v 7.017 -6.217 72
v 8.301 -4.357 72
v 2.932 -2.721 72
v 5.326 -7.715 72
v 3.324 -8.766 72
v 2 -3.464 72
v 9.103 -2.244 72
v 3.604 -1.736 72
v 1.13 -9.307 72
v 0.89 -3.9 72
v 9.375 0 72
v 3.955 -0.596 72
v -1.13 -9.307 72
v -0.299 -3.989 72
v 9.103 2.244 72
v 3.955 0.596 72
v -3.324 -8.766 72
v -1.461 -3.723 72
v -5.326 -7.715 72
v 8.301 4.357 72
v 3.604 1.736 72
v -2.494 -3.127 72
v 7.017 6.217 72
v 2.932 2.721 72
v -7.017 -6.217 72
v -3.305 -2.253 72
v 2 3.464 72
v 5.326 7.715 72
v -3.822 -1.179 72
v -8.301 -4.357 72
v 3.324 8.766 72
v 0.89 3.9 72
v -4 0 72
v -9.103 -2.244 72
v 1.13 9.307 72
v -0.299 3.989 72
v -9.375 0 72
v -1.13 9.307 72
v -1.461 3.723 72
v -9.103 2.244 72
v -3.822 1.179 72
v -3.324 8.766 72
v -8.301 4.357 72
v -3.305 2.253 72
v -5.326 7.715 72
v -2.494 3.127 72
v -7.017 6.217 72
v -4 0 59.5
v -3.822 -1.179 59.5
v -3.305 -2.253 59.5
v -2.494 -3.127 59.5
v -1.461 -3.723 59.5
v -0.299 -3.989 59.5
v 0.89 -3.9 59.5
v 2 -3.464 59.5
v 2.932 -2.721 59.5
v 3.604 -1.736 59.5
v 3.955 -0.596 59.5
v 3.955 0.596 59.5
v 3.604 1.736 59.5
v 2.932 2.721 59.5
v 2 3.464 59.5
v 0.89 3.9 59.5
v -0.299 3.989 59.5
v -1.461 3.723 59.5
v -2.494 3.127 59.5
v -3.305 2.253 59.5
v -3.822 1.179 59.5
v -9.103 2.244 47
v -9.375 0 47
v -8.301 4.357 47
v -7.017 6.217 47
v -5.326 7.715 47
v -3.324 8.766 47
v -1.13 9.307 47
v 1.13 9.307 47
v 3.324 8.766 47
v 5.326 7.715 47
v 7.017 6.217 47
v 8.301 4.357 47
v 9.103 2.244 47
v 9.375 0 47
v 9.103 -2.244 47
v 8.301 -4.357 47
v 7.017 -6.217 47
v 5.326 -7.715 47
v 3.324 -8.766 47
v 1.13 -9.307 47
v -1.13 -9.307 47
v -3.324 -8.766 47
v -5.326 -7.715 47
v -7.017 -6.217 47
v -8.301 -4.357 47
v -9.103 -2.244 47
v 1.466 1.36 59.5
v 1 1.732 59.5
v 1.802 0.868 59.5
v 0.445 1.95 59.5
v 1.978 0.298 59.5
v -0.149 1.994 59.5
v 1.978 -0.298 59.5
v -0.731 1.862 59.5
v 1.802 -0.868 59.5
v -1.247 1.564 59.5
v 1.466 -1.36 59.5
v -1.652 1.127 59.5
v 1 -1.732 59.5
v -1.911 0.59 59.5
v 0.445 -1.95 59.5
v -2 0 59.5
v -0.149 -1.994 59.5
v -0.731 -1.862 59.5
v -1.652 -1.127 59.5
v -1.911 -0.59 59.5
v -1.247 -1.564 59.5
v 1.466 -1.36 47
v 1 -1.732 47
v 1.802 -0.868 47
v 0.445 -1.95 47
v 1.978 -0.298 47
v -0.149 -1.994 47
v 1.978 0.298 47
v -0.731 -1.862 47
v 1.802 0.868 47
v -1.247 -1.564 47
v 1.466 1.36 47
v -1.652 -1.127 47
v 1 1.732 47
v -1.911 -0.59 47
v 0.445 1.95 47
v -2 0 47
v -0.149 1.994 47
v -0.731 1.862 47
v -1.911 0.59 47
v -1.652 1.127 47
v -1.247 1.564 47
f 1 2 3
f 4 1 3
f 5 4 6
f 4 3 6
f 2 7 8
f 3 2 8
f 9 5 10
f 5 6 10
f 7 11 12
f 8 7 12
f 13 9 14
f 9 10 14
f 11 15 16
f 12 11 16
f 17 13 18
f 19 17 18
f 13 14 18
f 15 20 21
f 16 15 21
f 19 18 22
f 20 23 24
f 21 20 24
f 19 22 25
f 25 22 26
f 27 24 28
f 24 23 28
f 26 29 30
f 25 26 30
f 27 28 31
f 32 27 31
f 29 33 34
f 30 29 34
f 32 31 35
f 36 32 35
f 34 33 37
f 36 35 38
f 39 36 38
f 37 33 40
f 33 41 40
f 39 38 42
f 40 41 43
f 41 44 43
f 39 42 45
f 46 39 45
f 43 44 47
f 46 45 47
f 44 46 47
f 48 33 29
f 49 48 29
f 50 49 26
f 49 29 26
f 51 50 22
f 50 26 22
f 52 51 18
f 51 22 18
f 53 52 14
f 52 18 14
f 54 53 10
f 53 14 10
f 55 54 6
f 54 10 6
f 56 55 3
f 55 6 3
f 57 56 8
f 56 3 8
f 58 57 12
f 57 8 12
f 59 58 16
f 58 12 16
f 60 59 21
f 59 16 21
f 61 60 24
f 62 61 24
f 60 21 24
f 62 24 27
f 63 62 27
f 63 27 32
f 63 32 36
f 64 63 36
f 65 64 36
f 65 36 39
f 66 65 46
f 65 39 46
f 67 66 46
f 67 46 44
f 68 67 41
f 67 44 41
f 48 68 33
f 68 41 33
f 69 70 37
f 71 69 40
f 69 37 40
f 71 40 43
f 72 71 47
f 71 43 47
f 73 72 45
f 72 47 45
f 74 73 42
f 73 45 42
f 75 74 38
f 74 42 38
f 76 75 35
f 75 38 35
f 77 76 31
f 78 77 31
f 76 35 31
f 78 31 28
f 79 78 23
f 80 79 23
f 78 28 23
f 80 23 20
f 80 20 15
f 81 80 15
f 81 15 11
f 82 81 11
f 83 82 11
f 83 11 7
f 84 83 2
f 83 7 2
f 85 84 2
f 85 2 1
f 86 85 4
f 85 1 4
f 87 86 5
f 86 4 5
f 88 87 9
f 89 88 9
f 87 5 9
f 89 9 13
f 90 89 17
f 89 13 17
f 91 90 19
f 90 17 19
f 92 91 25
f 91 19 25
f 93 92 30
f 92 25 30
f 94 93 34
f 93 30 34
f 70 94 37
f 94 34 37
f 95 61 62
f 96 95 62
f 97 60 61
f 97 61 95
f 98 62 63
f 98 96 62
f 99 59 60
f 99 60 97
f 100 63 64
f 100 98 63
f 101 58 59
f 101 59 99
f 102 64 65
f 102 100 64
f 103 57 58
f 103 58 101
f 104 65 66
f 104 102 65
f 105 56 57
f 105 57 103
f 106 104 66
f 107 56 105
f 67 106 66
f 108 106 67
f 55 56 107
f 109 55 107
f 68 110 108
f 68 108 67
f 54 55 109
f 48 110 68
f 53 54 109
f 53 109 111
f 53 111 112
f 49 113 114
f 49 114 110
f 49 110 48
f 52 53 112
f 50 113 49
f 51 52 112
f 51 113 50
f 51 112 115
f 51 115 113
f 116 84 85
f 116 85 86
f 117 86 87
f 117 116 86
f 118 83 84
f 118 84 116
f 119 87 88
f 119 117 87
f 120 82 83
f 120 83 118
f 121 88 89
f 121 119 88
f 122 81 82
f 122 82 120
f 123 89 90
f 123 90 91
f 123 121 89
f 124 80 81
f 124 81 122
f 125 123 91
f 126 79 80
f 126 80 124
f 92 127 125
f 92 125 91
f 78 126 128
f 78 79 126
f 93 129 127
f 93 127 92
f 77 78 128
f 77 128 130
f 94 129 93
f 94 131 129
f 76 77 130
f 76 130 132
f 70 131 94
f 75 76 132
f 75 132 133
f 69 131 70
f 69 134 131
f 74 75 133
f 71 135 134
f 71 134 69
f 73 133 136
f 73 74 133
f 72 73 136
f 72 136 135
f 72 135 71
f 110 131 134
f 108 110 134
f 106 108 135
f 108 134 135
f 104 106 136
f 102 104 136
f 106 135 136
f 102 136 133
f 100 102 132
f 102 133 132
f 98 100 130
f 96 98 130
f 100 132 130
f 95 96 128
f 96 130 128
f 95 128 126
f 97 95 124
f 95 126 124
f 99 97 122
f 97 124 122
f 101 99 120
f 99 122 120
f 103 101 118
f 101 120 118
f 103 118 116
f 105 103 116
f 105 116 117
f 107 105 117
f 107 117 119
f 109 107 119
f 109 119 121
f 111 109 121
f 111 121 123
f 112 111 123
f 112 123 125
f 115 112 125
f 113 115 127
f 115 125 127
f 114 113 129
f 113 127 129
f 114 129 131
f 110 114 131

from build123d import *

# Parameters (mm, degrees)
SKETCH_R             = 9.375
PAD_DEPTH            = 25
SKETCH001_R          = 2
POCKET_DEPTH         = 12.5
SKETCH002_R          = 4
POCKET001_DEPTH      = 12.5
BODY_PLACEMENT_ANGLE = 180


with BuildPart() as part:
    # Sketch → Pad (new body)
    with BuildSketch(Plane.XY):
        Circle(SKETCH_R)
    extrude(amount=PAD_DEPTH)

    # Sketch001 (on Face3 of Pad) → Pocket (cut)
    with BuildSketch(Plane.XY.offset(25)):
        Circle(SKETCH001_R)
    extrude(amount=-POCKET_DEPTH, mode=Mode.SUBTRACT)

    # Sketch002 (on Face2 of Pocket) → Pocket001 (cut)
    with BuildSketch(Plane(origin=(0, 0, 0), x_dir=(1, 0, 0), z_dir=(0, 0, -1))):
        Circle(SKETCH002_R)
    extrude(amount=-POCKET001_DEPTH, mode=Mode.SUBTRACT)


with BuildPart() as part_1:
    # Body placement: moved
    add(part.part.moved(Location((0, 0, 72))).rotate(Axis((0, 0, 72), (0, 1, 0)), BODY_PLACEMENT_ANGLE))


solid = part_1.part
